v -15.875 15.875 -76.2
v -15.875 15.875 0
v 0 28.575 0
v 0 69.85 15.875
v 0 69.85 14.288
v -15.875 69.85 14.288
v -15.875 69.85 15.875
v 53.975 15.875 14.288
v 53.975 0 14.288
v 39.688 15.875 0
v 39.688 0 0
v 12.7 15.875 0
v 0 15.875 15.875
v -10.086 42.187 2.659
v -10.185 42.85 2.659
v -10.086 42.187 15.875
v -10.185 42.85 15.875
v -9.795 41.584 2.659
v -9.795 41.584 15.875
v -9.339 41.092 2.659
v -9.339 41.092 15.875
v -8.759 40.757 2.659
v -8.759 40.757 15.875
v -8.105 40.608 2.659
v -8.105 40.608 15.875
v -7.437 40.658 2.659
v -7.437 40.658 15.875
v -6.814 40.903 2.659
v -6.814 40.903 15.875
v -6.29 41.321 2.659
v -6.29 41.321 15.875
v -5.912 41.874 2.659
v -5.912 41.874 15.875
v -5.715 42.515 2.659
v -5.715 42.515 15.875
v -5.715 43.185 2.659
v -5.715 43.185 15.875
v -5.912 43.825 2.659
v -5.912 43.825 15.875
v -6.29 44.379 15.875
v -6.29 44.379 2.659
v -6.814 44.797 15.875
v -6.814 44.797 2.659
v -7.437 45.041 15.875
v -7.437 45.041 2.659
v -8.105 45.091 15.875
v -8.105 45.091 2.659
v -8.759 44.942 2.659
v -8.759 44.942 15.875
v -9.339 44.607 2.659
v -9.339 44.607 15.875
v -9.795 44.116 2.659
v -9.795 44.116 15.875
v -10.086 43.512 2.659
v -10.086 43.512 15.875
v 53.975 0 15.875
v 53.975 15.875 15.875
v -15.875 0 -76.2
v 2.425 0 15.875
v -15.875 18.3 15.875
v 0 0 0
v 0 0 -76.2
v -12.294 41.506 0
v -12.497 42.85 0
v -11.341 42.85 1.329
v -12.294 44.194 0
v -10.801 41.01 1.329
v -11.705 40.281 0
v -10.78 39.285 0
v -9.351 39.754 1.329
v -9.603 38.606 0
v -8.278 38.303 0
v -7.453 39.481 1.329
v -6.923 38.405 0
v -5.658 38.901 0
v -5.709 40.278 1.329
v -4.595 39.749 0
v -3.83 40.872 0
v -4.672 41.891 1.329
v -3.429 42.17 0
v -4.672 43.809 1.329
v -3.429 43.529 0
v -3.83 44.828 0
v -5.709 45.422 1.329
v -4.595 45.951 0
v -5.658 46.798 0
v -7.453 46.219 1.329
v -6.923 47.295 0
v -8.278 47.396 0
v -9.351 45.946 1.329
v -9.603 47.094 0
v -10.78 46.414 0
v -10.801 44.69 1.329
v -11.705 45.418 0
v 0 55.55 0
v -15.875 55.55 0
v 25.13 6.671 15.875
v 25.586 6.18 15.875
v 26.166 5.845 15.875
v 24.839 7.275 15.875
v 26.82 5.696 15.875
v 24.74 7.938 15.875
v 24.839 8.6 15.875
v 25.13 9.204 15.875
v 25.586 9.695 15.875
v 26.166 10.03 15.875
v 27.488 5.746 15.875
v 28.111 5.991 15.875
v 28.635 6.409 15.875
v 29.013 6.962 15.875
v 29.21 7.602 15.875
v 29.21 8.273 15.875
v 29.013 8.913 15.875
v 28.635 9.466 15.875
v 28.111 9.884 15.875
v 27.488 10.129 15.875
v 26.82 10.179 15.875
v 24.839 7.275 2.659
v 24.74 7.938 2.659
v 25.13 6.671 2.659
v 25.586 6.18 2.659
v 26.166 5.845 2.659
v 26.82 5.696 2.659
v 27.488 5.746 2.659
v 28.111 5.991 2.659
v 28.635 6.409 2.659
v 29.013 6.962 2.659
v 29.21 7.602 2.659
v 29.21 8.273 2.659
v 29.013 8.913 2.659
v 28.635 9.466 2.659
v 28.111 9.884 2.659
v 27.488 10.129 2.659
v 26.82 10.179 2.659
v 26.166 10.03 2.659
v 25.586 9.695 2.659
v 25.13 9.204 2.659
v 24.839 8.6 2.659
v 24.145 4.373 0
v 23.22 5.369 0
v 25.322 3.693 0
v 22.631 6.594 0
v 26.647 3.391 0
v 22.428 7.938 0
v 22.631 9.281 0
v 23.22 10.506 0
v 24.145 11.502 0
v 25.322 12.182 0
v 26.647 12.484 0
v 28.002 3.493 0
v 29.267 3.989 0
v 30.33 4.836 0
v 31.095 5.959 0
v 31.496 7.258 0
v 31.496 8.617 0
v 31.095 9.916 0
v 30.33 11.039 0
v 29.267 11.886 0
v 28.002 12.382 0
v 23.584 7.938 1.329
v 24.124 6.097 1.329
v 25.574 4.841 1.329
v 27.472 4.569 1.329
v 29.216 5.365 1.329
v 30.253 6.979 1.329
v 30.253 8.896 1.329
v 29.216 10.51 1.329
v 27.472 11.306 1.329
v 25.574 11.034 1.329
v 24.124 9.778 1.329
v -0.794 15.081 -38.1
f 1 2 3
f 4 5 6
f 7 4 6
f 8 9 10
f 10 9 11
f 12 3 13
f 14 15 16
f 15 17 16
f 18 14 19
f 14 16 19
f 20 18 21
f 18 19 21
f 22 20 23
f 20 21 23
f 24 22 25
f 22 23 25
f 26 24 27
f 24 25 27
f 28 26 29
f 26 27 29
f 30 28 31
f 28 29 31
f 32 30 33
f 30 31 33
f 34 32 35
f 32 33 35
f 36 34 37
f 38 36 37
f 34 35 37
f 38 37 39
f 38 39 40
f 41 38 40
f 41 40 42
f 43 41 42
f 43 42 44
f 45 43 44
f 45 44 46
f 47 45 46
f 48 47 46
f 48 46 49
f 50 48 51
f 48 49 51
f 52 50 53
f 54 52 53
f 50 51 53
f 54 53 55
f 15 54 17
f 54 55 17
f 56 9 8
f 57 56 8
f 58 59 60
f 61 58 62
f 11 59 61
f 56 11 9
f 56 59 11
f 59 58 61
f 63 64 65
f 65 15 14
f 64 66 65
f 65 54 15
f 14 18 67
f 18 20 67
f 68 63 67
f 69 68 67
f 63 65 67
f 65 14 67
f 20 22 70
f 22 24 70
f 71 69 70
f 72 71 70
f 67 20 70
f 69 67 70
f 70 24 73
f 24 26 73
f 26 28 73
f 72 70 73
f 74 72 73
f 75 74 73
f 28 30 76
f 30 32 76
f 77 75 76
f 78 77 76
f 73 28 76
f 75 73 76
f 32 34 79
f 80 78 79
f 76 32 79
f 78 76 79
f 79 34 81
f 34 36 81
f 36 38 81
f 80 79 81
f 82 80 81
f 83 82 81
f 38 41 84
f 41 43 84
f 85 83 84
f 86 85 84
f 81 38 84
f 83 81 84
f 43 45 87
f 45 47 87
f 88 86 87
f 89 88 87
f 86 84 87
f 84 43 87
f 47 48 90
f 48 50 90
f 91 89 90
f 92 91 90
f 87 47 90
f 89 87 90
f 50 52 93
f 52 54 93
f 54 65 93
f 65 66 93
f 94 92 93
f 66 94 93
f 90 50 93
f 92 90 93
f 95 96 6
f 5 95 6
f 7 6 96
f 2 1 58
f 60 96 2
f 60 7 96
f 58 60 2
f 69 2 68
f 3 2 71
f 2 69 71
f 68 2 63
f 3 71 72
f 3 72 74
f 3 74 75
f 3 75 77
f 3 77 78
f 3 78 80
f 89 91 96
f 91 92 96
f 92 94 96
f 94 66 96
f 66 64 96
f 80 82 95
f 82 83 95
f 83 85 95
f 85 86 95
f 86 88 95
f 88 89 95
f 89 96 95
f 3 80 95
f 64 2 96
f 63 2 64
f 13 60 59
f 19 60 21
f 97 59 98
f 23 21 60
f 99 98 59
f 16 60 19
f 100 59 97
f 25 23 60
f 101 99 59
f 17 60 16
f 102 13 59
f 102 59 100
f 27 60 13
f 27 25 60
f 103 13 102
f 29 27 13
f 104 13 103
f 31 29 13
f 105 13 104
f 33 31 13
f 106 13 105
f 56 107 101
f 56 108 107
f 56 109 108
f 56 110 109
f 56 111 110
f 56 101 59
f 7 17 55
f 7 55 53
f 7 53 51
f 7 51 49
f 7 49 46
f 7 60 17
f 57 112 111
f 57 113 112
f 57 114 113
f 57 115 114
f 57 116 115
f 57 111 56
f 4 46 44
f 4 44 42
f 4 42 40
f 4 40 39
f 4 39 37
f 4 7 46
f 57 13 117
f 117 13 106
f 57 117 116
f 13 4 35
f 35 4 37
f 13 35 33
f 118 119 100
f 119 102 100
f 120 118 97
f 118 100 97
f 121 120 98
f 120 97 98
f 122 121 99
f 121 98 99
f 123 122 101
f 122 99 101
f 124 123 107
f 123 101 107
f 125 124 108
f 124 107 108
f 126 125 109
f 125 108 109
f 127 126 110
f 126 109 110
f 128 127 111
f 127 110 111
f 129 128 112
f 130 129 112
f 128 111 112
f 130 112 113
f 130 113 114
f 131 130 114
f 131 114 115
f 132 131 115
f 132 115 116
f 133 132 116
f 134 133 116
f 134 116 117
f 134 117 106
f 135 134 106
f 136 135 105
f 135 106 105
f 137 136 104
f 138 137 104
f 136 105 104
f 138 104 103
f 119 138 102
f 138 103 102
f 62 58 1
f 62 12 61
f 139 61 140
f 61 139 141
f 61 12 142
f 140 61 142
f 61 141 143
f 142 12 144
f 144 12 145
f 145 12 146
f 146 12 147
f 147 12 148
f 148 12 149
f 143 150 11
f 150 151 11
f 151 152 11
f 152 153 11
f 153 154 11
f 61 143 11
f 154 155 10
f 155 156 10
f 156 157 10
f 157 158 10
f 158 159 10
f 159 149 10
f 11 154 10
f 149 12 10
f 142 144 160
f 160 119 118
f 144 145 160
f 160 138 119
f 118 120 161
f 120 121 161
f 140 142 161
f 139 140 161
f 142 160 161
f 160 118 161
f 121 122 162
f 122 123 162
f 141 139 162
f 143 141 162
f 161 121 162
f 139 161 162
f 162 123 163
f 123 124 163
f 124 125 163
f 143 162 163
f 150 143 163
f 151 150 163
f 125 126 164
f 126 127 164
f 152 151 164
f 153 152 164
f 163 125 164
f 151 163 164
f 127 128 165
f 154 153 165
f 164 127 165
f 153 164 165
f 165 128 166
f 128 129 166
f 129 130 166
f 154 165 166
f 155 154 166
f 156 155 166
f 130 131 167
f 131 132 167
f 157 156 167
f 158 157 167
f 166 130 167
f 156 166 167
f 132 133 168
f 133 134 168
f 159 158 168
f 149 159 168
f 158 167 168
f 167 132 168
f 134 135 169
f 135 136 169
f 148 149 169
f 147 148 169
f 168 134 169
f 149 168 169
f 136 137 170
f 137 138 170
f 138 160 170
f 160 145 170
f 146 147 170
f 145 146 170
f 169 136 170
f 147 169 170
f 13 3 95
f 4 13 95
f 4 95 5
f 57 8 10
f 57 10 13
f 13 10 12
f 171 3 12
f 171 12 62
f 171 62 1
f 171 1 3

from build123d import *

# Parameters (mm, degrees)
F1_DEPTH        = 15.875
F2_W            = 15.875
F2_H            = 15.875
F3_DEPTH        = 76.2
F6_W            = 105.9110574424
F6_H            = 138.153988868
F7_DEPTH        = 12.8143632709
F20_DEPTH       = 15.875
F22_DEPTH       = 15.875
F24_D           = 4.4958
F24_DEPTH       = 15.875
F24_CSINK_D     = 9.1186
F24_CSINK_ANGLE = 82
F24_TIP         = 1.3506745855


with BuildPart() as f1:
    # F0 (on Top) → F1 (new body)
    with BuildSketch(Plane.XY):
        Polygon((-15.875, 0), (0, 0), (53.975, 0), (53.975, 15.875), (0, 15.875), (0, 69.85), (-15.875, 69.85), align=None)
    extrude(amount=F1_DEPTH)

    # F2 (on face) → F3 (join)
    with BuildSketch(Plane(origin=(0, 0, 0), x_dir=(1, 0, 0), z_dir=(0, 0, -1))):
        with Locations((-7.9375, -7.9375)):
            Rectangle(F2_W, F2_H)
    extrude(amount=F3_DEPTH)

    # F6 (on face) → F7 (cut, through all)
    with BuildSketch(Plane(origin=(-0.3578752004, -0.3578752004, 0.0711293976), x_dir=(-0.6867913388, 0.7139219677, 0.1365030439), z_dir=(0.7002252666, 0.7002252666, -0.139173101))):
        with Locations((-0.5843583494, -35.3862922639)):
            Rectangle(F6_W, F6_H)
    extrude(amount=-F7_DEPTH, mode=Mode.SUBTRACT)

    # F9 (on face) → F10 section 0
    with BuildSketch(Plane(origin=(0, 0, 0), x_dir=(1, 0, 0), z_dir=(0, 0, -1)), mode=Mode.PRIVATE) as f10_s0:
        Polygon((0, -28.575), (0, -15.875), (-15.875, -15.875), align=None)
    loft([f10_s0.sketch, Vertex(-15.875, 15.875, -76.2)])

    # F11 (on face) → F12 section 0
    with BuildSketch(Plane(origin=(0, 0, 0), x_dir=(1, 0, 0), z_dir=(0, 0, -1)), mode=Mode.PRIVATE) as f12_s0:
        Polygon((0, 0), (0, -15.875), (12.7, -15.875), align=None)
    loft([f12_s0.sketch, Vertex(0, 0, -76.2)])

    # F13 (on face) → F14 section 0
    with BuildSketch(Plane(origin=(0, 0, 0), x_dir=(1, 0, 0), z_dir=(0, 0, -1)), mode=Mode.PRIVATE) as f14_s0:
        Polygon((12.7, -15.875), (0, -15.875), (0, -28.575), align=None)
    loft([f14_s0.sketch, Vertex(0, 15.875, 15.875)])

    # F15 (on face) → F16 section 0
    with BuildSketch(Plane(origin=(0, 0, -76.2), x_dir=(1, 0, 0), z_dir=(0, 0, -1)), mode=Mode.PRIVATE) as f16_s0:
        Polygon((0, -15.875), (0, 0), (-15.875, -15.875), align=None)
    loft([f16_s0.sketch, Vertex(0, 15.875, 0)], mode=Mode.SUBTRACT)

    # F14_face (on face) → F18 section 0
    with BuildSketch(Plane(origin=(4.2333333333, 20.1083333333, 0), x_dir=(1, 0, 0), z_dir=(0, 0, -1))):
        Polygon((8.4666666667, 4.2333333333), (-4.2333333333, 4.2333333333), (-4.2333333333, -8.4666666667), align=None)
    # F3_face (on face) → F18 section 1
    with BuildSketch(Plane(origin=(-7.9375, 7.9375, -76.2), x_dir=(1, 0, 0), z_dir=(0, 0, -1))):
        Polygon((-7.9375, -7.9375), (7.9375, 7.9375), (-7.9375, 7.9375), align=None)
    loft()

    # F19 (on face) → F20 (cut, through all)
    with BuildSketch(Plane(origin=(-15.875, 0, 0), x_dir=(0, -1, 0), z_dir=(-1, 0, 0))):
        Polygon((-69.85, 14.2875), (-69.85, 0), (-55.5498, 0), align=None)
    extrude(amount=-F20_DEPTH, mode=Mode.SUBTRACT)

    # F21 (on face) → F22 (cut, through all)
    with BuildSketch(Plane.XZ):
        Polygon((39.6875, 0), (53.975, 0), (53.975, 14.2875), align=None)
    extrude(amount=-F22_DEPTH, mode=Mode.SUBTRACT)

    # F24
    with Locations(Plane(origin=(0, 0, 0), x_dir=(1, 0, 0), z_dir=(0, 0, -1))):
        with Locations((-7.9375, -42.8498), (26.9875, -7.9375)):
            CounterSinkHole(F24_D / 2, F24_CSINK_D / 2, depth=F24_DEPTH, counter_sink_angle=F24_CSINK_ANGLE)
            with Locations((0, 0, -(F24_DEPTH + F24_TIP / 2))):  # 118° drill point
                Cone(0, F24_D / 2, F24_TIP, mode=Mode.SUBTRACT)


solid = f1.part
